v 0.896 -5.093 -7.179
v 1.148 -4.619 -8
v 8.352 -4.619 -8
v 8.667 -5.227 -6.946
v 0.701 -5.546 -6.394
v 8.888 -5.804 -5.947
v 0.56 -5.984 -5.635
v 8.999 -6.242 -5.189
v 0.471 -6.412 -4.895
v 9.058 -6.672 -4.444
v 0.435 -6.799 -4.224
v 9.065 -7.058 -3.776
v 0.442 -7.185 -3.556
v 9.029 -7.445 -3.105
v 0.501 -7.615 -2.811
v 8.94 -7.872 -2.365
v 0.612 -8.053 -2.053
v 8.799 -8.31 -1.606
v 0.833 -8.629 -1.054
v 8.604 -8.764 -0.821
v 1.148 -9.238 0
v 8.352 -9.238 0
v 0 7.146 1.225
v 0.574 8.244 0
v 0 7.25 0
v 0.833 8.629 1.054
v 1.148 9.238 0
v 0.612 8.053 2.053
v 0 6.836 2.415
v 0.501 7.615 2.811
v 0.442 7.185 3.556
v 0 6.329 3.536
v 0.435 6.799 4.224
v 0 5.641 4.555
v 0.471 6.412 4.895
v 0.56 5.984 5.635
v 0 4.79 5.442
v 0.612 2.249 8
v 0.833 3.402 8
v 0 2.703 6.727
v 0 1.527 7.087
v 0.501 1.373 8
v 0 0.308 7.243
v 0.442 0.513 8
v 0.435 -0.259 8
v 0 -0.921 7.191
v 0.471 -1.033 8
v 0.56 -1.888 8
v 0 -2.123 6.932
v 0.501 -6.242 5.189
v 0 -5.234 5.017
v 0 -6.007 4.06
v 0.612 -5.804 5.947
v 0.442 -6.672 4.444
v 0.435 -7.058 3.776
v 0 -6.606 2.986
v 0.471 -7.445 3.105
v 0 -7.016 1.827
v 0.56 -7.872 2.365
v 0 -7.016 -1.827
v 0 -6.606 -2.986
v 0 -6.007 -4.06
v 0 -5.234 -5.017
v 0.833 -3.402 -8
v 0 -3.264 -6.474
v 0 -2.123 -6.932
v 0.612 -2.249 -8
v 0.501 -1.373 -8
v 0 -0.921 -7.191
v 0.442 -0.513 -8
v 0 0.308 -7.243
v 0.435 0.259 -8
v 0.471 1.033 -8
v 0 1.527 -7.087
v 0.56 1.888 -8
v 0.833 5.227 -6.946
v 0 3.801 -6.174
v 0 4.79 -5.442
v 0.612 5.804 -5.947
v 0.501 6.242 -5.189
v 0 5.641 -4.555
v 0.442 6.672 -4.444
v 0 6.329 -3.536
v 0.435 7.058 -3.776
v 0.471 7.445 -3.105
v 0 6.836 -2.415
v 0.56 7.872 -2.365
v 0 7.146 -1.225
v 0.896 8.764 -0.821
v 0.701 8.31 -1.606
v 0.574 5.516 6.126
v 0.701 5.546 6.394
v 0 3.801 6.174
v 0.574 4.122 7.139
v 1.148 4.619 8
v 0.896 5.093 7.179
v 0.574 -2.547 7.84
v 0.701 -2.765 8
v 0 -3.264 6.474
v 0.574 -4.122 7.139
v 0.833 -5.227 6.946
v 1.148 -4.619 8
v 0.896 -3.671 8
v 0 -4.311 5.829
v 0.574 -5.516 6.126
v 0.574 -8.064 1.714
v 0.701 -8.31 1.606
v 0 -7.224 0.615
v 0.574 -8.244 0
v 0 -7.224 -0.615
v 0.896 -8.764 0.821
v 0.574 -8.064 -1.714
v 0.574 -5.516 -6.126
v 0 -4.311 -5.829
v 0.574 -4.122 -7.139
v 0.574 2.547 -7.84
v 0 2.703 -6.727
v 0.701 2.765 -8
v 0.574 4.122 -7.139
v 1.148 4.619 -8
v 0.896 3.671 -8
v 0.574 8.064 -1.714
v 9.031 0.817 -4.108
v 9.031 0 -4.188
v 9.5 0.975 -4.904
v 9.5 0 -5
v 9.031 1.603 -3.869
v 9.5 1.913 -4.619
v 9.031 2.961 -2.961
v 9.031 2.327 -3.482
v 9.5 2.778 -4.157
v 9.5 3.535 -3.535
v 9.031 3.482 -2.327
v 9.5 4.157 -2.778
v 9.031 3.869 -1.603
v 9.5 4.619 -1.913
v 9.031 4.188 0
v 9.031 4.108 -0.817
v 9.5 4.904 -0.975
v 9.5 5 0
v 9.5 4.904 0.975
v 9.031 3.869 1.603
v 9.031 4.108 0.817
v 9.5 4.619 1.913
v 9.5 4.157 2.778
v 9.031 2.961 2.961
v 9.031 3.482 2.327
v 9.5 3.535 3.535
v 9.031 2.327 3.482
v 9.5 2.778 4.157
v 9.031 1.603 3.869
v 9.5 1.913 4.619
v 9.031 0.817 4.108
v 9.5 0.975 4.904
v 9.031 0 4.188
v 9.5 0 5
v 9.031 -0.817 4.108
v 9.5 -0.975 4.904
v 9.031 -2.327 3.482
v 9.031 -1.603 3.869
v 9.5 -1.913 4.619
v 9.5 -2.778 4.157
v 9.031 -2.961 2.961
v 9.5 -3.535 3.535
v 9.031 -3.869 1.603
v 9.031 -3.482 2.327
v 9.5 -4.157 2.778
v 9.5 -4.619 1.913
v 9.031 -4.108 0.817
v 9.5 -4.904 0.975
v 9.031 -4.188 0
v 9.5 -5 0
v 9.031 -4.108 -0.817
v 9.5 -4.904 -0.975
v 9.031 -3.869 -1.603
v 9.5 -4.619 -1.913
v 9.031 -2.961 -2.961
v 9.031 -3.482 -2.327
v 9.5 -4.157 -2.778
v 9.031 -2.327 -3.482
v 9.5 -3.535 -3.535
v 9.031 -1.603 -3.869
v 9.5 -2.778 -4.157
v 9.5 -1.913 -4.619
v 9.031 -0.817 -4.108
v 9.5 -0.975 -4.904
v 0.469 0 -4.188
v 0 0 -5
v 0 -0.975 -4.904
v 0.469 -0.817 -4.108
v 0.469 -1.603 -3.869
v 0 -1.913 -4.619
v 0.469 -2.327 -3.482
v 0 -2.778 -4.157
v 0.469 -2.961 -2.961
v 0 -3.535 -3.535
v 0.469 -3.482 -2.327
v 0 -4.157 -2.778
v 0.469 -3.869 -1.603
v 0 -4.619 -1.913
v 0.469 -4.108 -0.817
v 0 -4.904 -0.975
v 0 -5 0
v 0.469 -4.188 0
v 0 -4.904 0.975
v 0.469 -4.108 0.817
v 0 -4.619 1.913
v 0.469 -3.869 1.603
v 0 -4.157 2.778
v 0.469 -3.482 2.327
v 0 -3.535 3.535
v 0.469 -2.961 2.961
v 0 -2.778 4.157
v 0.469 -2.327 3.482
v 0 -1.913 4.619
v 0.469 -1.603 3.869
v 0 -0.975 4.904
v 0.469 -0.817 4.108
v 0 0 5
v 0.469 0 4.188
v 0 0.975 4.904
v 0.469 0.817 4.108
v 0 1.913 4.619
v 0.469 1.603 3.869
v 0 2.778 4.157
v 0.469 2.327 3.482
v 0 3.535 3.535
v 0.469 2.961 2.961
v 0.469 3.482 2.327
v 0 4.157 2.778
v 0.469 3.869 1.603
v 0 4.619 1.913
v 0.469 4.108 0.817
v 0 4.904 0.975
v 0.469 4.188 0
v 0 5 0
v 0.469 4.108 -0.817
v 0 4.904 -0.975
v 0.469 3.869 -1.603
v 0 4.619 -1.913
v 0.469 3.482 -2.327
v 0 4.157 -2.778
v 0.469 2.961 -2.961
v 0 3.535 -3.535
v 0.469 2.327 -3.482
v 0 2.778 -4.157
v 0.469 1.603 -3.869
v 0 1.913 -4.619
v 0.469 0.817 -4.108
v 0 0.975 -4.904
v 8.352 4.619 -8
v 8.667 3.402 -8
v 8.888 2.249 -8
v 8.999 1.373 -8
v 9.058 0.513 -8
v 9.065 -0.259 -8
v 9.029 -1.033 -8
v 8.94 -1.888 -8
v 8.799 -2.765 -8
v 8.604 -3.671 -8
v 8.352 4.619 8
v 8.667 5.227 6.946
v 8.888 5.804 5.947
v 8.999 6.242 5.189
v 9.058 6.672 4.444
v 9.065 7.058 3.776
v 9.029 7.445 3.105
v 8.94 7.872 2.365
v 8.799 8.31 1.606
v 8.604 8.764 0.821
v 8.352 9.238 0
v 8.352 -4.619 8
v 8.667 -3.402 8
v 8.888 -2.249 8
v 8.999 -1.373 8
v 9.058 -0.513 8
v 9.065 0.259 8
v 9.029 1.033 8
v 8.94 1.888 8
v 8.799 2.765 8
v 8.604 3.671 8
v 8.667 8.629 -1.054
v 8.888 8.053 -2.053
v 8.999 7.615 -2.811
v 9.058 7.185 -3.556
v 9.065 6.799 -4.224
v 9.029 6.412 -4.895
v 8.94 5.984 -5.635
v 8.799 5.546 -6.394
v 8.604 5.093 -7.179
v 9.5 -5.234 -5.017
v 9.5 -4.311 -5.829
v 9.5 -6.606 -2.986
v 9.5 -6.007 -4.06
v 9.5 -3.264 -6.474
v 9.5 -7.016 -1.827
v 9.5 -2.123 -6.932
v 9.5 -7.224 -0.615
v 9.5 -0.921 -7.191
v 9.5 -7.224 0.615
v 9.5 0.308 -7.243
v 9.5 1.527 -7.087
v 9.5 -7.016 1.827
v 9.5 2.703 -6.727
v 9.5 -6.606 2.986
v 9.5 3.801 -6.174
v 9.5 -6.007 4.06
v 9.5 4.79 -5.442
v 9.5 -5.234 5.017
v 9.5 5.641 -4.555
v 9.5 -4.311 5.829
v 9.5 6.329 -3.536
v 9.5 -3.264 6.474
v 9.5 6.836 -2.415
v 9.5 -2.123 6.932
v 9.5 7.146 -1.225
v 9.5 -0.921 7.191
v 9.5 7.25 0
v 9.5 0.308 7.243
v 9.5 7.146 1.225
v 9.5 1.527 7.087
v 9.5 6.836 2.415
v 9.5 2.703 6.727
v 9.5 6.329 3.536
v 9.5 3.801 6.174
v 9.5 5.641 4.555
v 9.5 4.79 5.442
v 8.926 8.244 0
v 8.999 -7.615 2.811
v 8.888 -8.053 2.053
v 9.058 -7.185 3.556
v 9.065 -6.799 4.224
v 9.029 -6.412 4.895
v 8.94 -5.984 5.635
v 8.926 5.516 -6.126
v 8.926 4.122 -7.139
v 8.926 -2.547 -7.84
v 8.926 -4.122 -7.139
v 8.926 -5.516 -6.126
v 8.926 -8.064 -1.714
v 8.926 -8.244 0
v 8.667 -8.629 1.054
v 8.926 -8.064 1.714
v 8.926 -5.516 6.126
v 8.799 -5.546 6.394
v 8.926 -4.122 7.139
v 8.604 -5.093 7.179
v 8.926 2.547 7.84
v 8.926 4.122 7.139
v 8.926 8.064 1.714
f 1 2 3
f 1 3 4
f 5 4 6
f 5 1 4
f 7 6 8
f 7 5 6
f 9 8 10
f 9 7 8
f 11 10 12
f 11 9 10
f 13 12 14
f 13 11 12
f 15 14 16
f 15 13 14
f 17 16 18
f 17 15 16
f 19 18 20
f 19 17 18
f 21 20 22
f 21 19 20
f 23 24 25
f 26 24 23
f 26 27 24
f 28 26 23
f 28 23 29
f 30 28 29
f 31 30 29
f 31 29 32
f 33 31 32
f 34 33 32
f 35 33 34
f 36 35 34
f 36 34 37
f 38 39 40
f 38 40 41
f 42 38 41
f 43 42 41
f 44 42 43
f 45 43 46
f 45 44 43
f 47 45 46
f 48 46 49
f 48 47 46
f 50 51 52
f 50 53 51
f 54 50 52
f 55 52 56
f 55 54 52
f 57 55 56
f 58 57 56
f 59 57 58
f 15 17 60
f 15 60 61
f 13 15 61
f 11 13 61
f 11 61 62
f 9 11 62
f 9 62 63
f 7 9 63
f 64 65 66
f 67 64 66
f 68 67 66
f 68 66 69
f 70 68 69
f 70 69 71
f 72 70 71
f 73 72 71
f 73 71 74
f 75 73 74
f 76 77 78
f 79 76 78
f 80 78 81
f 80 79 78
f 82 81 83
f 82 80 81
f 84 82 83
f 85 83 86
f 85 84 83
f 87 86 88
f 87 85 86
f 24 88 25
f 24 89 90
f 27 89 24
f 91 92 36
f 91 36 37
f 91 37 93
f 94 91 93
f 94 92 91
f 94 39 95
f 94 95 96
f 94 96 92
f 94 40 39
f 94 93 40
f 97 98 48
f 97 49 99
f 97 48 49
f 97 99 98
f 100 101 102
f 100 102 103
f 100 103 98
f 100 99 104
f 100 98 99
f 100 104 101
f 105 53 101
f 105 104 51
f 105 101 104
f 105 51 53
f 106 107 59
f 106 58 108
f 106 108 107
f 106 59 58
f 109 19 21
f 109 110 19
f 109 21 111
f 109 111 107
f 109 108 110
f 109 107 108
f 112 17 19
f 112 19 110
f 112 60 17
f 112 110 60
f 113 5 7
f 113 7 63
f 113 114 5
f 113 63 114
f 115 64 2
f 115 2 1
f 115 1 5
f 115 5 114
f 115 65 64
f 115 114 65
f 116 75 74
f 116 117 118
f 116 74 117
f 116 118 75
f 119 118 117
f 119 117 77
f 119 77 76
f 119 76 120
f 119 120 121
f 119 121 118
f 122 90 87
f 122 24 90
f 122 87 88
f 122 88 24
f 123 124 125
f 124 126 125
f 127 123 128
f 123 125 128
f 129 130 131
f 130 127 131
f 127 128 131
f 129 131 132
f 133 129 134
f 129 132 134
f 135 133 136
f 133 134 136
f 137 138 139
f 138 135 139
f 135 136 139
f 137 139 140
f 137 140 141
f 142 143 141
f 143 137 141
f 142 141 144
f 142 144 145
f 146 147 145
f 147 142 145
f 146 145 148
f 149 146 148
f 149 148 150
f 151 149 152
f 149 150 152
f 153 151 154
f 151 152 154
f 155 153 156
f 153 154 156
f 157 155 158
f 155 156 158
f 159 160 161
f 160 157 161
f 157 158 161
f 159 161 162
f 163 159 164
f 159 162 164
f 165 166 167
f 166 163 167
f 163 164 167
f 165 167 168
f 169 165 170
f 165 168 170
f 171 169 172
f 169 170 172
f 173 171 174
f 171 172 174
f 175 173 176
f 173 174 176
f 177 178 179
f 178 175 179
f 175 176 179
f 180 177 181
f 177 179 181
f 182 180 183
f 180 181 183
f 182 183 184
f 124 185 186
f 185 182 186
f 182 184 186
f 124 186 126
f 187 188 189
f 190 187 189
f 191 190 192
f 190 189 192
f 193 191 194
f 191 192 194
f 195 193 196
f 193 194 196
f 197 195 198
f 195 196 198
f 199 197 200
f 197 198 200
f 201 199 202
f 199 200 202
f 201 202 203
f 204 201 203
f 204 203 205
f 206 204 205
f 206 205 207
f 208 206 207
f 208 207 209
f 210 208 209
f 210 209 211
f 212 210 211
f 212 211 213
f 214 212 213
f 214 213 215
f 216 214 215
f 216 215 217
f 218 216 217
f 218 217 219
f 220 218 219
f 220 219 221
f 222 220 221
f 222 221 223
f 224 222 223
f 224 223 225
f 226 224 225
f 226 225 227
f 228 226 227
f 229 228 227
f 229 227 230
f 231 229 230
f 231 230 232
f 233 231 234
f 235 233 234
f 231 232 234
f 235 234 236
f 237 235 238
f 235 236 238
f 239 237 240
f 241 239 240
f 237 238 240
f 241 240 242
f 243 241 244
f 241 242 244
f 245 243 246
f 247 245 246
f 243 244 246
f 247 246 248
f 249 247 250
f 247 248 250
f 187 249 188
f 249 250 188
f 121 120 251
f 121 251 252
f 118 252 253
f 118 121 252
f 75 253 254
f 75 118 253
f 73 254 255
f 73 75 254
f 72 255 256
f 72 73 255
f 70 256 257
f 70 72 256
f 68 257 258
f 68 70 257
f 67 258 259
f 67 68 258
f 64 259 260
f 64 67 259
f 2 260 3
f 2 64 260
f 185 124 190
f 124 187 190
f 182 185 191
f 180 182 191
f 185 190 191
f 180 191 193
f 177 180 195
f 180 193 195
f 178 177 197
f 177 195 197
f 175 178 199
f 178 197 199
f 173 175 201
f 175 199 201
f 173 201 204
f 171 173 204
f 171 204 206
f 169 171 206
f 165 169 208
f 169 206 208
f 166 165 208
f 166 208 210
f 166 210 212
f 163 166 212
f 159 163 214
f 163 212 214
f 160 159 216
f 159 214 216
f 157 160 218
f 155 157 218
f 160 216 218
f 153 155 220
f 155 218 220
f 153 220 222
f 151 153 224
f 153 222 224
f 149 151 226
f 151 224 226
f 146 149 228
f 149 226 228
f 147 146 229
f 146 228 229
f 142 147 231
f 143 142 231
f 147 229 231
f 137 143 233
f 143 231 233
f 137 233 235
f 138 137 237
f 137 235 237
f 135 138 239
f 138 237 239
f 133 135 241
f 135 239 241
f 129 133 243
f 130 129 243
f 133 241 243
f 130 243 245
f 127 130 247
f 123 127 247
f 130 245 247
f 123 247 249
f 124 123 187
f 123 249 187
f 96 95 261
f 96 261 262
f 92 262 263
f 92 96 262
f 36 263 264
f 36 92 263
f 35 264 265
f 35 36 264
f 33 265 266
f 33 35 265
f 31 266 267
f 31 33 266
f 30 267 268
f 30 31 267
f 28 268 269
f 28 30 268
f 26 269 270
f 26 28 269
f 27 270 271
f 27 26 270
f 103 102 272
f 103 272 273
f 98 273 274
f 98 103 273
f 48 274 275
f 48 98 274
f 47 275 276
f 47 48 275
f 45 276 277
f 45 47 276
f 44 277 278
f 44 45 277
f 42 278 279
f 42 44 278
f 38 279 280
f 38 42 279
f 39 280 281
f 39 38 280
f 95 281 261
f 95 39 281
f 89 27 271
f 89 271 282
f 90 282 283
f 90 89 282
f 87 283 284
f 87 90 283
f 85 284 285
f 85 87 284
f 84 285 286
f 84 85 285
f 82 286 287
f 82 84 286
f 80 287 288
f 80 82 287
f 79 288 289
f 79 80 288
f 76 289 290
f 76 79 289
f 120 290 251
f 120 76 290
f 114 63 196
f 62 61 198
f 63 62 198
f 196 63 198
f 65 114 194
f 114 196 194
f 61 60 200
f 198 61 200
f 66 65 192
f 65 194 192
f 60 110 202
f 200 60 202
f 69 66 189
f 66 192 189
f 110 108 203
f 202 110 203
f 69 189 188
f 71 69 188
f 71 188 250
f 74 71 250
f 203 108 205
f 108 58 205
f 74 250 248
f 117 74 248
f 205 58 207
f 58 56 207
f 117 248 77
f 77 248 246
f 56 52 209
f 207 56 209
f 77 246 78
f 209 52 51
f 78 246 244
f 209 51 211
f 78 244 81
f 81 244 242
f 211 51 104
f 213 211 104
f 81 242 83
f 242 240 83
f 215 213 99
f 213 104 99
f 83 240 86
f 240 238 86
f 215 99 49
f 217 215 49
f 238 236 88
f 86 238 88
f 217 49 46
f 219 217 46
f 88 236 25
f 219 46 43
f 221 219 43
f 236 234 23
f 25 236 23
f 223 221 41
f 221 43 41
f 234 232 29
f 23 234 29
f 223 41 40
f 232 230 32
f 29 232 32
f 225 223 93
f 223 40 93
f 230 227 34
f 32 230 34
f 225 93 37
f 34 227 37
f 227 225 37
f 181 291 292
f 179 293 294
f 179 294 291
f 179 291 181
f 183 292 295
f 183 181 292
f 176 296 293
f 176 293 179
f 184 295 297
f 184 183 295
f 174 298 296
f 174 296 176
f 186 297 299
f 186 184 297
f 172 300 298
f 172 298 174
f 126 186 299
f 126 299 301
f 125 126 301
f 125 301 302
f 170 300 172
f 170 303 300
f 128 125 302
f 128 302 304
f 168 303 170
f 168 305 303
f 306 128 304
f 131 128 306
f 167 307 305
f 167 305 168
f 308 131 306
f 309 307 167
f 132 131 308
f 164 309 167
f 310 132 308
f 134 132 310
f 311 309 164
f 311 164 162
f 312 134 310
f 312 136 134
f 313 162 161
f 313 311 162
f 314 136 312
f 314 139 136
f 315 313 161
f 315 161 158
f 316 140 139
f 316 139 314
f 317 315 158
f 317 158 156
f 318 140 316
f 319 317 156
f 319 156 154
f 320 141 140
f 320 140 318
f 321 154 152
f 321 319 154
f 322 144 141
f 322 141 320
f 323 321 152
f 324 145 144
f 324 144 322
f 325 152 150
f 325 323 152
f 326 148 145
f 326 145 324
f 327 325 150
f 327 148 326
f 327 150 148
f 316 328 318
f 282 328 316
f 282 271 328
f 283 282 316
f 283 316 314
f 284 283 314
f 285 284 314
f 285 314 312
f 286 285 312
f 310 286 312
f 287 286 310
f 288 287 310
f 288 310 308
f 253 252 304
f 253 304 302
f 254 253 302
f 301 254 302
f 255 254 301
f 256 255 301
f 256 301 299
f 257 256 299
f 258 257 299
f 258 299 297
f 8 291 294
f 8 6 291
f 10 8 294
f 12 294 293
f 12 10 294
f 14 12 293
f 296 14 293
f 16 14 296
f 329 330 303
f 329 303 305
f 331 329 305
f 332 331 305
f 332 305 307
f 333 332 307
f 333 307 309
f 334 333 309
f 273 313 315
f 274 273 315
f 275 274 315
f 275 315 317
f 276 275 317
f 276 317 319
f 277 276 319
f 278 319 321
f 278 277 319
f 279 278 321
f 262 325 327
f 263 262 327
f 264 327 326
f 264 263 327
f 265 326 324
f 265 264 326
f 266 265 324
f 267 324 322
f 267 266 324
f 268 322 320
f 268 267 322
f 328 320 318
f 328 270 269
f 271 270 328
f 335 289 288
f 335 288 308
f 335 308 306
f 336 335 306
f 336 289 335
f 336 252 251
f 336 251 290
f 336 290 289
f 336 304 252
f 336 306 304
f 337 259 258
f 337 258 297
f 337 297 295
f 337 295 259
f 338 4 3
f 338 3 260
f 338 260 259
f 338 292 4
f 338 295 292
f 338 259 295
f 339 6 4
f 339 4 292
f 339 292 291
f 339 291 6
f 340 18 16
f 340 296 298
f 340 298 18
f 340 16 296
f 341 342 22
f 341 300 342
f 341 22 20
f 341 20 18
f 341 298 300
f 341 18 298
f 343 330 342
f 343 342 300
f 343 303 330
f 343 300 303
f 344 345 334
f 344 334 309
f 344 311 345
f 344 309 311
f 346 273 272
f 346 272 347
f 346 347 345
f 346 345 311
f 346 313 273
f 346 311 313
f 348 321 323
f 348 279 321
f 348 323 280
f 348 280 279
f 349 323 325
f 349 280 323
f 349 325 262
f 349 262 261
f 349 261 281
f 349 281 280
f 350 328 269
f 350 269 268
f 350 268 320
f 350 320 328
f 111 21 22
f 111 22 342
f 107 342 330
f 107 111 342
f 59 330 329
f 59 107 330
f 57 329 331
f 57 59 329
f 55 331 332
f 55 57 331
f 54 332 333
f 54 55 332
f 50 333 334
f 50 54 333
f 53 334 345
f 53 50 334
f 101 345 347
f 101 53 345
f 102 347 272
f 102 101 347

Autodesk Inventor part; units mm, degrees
ref_plane "YZ Plane" through (0, 0, 0) normal (1, 0, 0) x (0, 1, 0)
ref_plane "XZ Plane" through (0, 0, 0) normal (0, 1, 0) x (-1, 0, 0)
sketch "Sketch1" plane through (0, 0, 0) normal (1, 0, 0) x (0, 1, 0)
  line L0 (-9.2376, 0) -> (-4.6188, 8)
  line L1 (-4.6188, 8) -> (4.6188, 8)
  line L2 (4.6188, 8) -> (9.2376, 0)
  line L3 (9.2376, 0) -> (4.6188, -8)
  line L4 (4.6188, -8) -> (-4.6188, -8)
  line L5 (-4.6188, -8) -> (-9.2376, 0)
  point P0 (0, 0)
  point P1 (0, 0)
  dimension "d0" = 18.4752
extrude "Body" add sketch "Sketch1" along normal blind 9.5
sketch "Sketch2" plane through (0, 0, 0) normal (0, 0, 1) x (1, 0, 0)
  line L0 (0, 4.6188) -> (0, 9.2376) projected
  line L1 (0, 9.2376) -> (9.5, 9.2376) projected
  line L2 (9.5, 4.6188) -> (9.5, 9.2376) projected
  line L3 (-1.9, 0) -> (11.4, 0) projected
  line L4 (1.1475, 9.2376) -> (0, 7.25)
  line L5 (8.3525, 9.2376) -> (9.5, 7.25)
  dimension "d3" = 30
  dimension "d4" = 30
  dimension "d5" = 14.5
  dimension "d6" = 14.5
revolve "Chamfer1" cut sketch "Sketch2" angle 360 about axis through (-10, 0, 0) along (1, 0, 0)
sketch "Sketch3" plane through (9.5, 0, 0) normal (1, 0, 0) x (0, 0, -1)
  arc A0 (-0.625, -1.0825) -> (0.625, -1.0825) centre (0, 0) ccw projected
hole "Thread" at (9.5, 0, 0) direction (-1, 0, 0) diameter 8.376 end through all thread size "M10x1.5" class "6H" standard "ISO Metric profile"
chamfer "Chamfer2" distance 0.8119 angle 30 1 edges at (9.5, 0, 4.188) measured on face at (9.5, 6.1489, -0.7466)
chamfer "Chamfer3" distance 0.8119 angle 30 1 edges at (0, 0, 4.188) measured on face at (0, 6.1489, -0.7466)
ref_plane "Work Plane1" through (-16.8587, 0, 0) normal (0, -0.866, -0.5) x (1, 0, 0)
equation "\"d0\" = 1.1547 * SW"
equation "\"d1\" = KOH"
equation "\"d3\" = ANG1"
equation "\"d4\" = ANG2"
equation "\"d5\" = SW0"
equation "\"d6\" = SW01"
equation "\"d8\" = -0.5 * GD1 + 0.5 * NND"
equation "\"d40\" = -0.5 * GD1 + 0.5 * NND"
equation "\"d10\" = -0.5 * GD1 + 0.5 * NND"
equation "\"d41\" = -0.5 * GD1 + 0.5 * NND"
equation "\"ANG1\" = 30deg"
equation "\"ANG2\" = 30deg"
equation "\"KOH\" = 9.5"
equation "\"SW\" = 16"
equation "\"SW0\" = 14.5"
equation "\"SW01\" = 14.5"
equation "\"GUL\" = 0.541266 * PTC"
equation "\"TOA\" = 30deg"
equation "\"PTC\" = 1.5"
equation "\"E0\" = 1.155 * SW"
equation "\"GAL\" = 0.541266 * PTC"
equation "\"GD1\" = 8.376202"
equation "\"NND\" = 10"
properties part number "ISO 4034 - M10" material "Stainless Steel"
